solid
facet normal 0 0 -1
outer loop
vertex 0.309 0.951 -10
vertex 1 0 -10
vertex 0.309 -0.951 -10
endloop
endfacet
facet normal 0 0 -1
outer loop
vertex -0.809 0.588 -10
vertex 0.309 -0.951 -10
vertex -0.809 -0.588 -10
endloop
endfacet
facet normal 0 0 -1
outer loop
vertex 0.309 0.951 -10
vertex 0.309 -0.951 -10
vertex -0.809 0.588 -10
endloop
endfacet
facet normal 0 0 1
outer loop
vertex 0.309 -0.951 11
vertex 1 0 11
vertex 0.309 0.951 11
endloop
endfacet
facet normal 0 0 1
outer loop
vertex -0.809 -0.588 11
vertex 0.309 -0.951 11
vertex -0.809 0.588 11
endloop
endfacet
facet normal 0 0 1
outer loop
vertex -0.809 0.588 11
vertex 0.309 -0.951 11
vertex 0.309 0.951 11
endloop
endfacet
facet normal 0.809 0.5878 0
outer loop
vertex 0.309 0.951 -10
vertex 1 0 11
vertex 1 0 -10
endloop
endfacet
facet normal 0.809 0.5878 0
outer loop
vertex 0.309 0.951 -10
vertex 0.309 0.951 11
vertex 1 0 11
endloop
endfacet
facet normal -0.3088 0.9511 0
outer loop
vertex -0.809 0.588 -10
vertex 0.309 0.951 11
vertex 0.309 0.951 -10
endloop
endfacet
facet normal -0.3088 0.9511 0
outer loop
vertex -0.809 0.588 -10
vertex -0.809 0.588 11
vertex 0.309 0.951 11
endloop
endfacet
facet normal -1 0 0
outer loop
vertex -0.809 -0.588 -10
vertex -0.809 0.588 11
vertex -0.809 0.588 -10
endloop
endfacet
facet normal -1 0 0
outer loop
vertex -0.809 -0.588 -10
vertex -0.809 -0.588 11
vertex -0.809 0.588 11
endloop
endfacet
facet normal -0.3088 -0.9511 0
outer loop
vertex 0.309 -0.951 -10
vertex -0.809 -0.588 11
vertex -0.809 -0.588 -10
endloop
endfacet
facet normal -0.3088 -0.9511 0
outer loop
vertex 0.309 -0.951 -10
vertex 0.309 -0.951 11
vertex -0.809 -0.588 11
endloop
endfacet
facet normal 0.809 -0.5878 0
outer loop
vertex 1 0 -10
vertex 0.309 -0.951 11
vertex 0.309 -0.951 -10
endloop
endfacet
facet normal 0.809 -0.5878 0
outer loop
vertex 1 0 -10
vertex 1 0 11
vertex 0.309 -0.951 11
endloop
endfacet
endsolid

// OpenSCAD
// Unit of length: Unit.MM
translate(v = [0.0, 0.0, -10.0])
{
   linear_extrude(height = 21.0, center = false, twist = 0.0, scale = 1.0)
   {
      circle(d = 2.0);
   }
}
